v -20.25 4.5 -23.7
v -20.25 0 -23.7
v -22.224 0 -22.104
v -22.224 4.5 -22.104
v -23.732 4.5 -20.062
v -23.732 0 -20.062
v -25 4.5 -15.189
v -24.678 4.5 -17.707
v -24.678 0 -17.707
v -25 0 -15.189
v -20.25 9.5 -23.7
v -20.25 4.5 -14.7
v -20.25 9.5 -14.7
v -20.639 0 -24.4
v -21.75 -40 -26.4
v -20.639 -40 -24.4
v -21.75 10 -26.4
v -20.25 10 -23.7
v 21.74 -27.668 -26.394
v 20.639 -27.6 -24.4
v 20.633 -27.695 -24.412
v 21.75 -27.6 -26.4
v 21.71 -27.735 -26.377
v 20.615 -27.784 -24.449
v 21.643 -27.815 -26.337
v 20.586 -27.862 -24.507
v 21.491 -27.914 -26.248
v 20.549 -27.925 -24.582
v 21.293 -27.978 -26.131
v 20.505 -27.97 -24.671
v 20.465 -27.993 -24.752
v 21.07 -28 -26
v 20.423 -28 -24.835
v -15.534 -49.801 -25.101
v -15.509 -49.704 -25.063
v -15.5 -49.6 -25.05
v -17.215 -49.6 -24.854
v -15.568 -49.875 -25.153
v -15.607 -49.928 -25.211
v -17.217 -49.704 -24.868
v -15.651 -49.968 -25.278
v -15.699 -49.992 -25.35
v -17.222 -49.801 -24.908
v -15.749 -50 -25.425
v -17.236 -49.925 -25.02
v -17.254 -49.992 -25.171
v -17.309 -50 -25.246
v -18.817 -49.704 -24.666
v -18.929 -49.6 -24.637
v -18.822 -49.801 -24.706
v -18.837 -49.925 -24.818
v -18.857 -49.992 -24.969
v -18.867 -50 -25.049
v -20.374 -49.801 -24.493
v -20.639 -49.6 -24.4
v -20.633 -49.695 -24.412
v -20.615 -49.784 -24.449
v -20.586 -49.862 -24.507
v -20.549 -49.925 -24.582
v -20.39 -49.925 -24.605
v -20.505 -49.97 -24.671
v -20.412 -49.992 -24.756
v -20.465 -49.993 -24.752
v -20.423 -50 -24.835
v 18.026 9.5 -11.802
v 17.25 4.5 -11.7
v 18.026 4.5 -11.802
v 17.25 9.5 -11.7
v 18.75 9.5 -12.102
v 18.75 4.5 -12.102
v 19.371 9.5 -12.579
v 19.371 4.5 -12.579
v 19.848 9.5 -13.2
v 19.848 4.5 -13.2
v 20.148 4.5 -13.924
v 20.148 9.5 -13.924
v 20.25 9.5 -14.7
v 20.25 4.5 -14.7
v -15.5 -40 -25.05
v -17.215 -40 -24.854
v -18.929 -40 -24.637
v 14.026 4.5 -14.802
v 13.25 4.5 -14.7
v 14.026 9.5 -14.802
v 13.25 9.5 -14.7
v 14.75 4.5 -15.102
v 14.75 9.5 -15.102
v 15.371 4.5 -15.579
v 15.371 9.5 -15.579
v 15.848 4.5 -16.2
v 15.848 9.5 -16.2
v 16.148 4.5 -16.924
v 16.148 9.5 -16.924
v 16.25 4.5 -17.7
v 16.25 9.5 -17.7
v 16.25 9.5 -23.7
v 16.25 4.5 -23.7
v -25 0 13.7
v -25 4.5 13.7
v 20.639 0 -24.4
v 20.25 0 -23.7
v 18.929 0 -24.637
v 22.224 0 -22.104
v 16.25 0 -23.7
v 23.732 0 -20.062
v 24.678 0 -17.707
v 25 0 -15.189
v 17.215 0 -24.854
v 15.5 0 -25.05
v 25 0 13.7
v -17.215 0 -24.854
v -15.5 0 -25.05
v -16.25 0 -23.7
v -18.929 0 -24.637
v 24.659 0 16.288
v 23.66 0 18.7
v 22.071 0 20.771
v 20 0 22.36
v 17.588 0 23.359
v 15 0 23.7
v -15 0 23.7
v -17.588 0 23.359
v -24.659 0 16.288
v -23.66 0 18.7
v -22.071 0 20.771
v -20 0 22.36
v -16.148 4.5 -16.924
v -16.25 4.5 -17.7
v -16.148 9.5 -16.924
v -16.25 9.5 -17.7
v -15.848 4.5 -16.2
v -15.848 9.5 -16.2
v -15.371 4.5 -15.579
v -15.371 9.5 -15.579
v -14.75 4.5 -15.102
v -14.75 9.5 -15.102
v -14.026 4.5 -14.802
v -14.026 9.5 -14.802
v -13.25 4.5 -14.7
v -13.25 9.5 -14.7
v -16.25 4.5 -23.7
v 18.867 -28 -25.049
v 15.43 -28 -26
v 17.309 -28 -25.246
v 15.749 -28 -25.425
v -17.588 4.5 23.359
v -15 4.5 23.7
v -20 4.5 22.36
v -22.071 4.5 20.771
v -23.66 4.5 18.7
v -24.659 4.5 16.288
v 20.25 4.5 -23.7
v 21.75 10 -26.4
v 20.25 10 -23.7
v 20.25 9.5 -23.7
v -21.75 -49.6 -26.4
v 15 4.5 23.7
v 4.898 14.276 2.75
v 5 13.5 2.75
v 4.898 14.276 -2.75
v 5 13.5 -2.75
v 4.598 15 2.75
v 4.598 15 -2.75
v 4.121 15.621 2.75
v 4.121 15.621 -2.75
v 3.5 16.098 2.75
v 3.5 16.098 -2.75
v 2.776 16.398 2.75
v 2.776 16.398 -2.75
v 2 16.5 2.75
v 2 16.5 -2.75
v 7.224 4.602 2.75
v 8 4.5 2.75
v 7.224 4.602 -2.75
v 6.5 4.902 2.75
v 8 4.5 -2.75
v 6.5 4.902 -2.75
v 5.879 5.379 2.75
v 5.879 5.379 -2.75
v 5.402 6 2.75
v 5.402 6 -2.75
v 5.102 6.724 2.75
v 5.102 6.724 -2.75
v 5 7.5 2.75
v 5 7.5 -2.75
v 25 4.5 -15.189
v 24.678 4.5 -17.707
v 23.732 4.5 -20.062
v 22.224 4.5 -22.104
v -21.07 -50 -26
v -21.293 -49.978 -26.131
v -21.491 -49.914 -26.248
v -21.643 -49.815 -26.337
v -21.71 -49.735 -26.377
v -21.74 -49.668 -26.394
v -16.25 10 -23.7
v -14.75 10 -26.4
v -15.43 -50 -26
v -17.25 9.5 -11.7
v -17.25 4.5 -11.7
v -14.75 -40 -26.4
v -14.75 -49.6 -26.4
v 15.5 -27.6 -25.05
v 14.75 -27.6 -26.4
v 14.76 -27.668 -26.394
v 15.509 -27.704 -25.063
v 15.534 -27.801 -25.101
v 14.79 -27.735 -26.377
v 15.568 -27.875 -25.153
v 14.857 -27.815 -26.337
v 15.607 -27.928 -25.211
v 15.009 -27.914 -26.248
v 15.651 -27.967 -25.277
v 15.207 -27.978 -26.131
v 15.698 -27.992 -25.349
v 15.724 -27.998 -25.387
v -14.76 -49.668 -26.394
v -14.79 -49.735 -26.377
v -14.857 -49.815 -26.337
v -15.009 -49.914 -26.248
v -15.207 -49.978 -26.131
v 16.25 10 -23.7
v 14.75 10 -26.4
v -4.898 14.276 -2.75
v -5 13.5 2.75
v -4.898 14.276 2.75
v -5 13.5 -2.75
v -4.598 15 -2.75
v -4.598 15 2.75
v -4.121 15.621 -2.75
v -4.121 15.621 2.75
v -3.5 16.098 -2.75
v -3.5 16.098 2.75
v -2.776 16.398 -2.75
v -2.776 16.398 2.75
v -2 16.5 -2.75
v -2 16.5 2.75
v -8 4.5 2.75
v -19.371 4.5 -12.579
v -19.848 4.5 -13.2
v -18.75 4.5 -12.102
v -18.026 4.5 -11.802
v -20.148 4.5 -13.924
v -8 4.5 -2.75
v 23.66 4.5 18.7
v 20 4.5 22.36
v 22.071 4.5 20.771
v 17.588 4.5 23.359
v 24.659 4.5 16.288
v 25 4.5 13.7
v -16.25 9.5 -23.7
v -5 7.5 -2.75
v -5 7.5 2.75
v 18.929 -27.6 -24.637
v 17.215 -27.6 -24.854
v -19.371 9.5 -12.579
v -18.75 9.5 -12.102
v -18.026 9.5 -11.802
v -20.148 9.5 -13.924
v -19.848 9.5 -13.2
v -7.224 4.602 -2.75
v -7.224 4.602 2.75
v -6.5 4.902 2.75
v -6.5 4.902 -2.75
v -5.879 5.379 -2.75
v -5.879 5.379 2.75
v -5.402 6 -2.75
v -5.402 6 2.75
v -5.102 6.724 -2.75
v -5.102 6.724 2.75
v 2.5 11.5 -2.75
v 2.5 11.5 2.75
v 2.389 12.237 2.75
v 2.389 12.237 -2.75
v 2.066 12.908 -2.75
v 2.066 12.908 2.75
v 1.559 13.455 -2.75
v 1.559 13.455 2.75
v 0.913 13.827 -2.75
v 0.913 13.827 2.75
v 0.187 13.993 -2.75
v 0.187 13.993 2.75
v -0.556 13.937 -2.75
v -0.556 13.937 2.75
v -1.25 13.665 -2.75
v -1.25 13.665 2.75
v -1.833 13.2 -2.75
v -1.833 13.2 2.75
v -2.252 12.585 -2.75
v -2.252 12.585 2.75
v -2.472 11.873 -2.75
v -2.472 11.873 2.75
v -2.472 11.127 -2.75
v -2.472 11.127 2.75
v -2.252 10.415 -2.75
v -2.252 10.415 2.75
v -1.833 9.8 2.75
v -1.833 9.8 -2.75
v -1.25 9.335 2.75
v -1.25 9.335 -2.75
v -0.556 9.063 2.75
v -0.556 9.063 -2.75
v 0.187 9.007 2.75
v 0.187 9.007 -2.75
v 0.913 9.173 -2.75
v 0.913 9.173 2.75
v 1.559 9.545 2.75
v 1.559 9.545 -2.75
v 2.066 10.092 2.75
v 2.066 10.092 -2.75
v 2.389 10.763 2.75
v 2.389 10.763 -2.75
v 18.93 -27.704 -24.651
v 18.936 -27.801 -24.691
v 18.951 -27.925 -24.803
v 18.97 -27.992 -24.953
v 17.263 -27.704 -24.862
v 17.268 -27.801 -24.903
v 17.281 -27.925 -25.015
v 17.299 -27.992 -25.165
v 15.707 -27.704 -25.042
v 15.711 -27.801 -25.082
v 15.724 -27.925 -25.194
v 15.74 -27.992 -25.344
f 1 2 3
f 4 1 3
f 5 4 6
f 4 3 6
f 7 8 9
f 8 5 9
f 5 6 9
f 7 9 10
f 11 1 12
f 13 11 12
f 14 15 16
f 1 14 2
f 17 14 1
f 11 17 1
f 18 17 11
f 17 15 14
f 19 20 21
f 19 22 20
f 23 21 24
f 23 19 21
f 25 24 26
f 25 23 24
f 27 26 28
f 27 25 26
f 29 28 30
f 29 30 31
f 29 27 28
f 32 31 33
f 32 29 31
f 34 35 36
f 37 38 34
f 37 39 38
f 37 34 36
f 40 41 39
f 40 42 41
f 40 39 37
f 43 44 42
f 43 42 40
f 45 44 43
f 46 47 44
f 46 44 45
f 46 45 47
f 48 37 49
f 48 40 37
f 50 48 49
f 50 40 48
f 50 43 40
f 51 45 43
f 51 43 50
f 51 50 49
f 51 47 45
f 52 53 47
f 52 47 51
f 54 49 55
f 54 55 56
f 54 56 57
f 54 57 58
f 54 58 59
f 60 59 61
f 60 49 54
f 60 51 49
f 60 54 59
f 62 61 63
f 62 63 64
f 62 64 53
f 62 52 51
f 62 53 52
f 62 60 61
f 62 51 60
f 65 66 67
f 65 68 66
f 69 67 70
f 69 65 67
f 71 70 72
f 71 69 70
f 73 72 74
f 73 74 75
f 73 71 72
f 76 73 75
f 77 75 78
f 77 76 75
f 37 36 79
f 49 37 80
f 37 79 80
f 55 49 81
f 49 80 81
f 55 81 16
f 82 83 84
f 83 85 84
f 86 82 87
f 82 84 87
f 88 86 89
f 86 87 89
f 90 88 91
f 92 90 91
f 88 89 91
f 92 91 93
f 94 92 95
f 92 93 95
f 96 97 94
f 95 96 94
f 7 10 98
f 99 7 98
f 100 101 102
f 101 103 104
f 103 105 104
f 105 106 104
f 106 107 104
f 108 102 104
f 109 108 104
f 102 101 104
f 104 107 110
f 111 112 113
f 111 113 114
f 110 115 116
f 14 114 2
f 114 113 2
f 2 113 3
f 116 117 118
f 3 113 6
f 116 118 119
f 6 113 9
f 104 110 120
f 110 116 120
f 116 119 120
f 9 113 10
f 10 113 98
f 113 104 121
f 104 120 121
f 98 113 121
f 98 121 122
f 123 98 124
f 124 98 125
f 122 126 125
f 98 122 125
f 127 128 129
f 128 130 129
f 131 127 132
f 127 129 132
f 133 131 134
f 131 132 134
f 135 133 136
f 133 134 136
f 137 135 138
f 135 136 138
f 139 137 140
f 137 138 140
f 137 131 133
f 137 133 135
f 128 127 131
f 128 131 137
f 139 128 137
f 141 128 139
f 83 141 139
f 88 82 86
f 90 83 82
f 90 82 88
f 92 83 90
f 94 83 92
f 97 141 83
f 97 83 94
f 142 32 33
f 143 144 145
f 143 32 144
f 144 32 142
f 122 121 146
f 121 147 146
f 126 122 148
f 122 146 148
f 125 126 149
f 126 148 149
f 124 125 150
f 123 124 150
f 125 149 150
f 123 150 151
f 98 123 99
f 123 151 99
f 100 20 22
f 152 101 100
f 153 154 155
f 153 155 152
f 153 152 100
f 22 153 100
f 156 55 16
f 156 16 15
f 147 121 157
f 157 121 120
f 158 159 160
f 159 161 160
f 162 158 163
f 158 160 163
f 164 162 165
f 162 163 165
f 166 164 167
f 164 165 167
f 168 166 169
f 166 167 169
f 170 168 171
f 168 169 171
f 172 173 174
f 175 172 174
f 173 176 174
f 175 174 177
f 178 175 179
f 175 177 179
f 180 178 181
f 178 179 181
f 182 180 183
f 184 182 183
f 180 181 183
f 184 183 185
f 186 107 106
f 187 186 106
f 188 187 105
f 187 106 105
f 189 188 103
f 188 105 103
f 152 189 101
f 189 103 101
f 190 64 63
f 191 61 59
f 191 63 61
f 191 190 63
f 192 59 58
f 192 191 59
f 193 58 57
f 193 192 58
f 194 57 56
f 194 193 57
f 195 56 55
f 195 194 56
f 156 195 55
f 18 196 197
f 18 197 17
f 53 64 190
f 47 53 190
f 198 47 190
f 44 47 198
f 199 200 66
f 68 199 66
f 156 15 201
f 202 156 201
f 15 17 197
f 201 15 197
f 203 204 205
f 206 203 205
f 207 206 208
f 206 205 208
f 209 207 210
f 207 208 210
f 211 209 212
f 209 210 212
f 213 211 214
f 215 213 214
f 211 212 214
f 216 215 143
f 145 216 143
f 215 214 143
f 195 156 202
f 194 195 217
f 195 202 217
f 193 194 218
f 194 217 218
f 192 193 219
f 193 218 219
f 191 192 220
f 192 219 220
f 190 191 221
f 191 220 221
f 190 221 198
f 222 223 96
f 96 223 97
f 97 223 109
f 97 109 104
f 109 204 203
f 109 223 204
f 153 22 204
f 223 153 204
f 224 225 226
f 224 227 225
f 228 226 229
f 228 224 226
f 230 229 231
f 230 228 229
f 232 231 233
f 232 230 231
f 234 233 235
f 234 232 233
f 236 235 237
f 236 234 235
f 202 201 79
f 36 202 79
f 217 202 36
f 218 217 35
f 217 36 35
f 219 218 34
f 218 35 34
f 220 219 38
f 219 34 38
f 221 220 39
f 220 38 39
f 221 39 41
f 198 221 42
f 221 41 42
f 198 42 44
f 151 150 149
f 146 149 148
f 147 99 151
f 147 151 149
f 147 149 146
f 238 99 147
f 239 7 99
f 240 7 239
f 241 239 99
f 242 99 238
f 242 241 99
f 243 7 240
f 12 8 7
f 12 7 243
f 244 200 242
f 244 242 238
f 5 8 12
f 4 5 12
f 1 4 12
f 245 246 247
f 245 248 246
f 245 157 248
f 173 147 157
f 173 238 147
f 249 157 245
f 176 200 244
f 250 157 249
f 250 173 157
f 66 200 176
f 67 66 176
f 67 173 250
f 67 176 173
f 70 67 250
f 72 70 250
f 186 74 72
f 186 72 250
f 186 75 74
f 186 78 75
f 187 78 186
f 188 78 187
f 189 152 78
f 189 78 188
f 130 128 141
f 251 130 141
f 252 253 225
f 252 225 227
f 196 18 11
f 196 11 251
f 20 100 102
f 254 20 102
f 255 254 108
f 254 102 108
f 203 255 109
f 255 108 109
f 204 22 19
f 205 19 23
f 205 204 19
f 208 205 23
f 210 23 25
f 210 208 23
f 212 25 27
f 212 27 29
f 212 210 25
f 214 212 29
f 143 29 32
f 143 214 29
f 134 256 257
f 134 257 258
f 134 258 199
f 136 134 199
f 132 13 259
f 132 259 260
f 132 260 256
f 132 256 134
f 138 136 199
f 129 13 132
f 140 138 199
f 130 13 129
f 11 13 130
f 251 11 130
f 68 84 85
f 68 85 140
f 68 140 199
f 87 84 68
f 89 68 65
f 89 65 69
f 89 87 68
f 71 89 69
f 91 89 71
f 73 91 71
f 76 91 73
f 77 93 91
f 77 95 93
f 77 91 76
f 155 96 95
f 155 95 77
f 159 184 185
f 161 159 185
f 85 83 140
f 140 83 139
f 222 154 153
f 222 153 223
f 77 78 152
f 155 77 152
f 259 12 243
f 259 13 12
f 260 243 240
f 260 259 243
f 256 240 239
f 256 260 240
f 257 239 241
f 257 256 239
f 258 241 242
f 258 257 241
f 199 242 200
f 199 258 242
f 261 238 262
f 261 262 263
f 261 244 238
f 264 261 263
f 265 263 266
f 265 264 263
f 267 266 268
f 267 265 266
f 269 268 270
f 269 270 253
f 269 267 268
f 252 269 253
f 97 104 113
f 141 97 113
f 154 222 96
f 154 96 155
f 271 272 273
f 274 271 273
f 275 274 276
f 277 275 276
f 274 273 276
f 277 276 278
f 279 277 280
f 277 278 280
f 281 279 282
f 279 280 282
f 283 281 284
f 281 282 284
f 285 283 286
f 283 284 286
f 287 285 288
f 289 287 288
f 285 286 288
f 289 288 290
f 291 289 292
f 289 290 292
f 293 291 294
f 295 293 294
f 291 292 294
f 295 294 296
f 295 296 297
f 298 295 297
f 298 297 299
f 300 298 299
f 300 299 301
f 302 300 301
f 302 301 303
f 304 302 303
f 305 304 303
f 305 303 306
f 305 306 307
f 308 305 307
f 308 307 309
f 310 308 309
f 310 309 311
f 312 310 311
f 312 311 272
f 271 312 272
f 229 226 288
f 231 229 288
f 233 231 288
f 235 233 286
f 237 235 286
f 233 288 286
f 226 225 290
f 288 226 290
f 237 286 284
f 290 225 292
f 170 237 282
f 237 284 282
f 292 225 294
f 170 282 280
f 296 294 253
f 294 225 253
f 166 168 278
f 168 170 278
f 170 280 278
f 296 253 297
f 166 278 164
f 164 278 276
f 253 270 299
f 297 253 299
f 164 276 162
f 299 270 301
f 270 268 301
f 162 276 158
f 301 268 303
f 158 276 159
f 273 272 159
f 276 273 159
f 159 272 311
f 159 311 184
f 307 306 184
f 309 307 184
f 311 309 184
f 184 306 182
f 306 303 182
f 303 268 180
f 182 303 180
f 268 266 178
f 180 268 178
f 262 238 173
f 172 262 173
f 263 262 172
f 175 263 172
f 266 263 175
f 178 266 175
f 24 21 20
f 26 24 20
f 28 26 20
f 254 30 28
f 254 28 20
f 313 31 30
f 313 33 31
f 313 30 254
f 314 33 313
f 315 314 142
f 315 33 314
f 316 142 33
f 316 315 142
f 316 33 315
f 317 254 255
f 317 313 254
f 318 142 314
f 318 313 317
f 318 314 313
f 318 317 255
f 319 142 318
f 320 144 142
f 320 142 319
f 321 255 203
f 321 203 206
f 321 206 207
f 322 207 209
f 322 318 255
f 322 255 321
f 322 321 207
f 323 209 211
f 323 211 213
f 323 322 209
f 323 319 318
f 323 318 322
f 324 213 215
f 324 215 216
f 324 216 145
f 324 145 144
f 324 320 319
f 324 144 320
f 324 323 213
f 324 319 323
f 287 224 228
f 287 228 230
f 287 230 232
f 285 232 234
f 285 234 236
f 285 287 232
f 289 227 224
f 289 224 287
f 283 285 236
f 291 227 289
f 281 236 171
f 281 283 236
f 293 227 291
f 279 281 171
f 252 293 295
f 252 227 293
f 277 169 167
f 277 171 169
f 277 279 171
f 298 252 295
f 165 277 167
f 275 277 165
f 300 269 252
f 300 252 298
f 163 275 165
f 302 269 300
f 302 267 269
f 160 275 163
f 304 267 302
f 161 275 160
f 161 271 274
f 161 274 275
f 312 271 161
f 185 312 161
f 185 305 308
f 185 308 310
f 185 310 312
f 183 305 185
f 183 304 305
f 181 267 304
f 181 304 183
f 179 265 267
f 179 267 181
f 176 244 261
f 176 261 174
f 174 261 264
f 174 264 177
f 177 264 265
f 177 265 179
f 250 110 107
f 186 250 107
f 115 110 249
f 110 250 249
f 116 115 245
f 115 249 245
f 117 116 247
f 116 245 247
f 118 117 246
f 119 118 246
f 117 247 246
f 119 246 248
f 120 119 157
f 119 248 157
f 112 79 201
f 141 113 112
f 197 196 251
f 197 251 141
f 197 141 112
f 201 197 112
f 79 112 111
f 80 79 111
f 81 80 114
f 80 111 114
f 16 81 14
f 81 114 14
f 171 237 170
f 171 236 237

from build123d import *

# Parameters (mm, degrees)
EXTRUDE_1_DEPTH      = 4.5
EXTRUDE_2_DEPTH      = 40
EXTRUDE_2_DEPTH_BACK = 10
CUT_EXTRUDE_1_DEPTH  = 111
FILLET_1_R           = 10
SKETCH_4_W           = 16.25
SKETCH_4_H           = 3
EXTRUDE_3_DEPTH      = 5
FILLET_2_R           = 10
SKETCH_5_W           = 10
SKETCH_5_H           = 5.5
EXTRUDE_4_DEPTH      = 12
SKETCH_6_R           = 2.5
CUT_EXTRUDE_2_DEPTH  = 6
FILLET_3_R           = 3
FILLET_4_R           = 3
EXTRUDE_5_DEPTH      = 10
SKETCH_8_W           = 7
SKETCH_8_H           = 12
CUT_EXTRUDE_3_DEPTH  = 11.8
FILLET_5_R           = 0.4


with BuildPart() as part:
    # 草图1 → 凸台-拉伸1 (new body)
    with BuildSketch(Plane(origin=(0, 0, 0), x_dir=(1, 0, 0), z_dir=(0, 1, 0))):
        Polygon((-25, 23.7), (-25, -23.7), (25, -23.7), (25, 23.7), (20.25, 23.7), (21.75, 26.4), (14.75, 26.4), (16.25, 23.7), (-16.25, 23.7), (-14.75, 26.4), (-21.75, 26.4), (-20.25, 23.7), align=None)
    extrude(amount=EXTRUDE_1_DEPTH)

    # 草图2 → 凸台-拉伸2 (add, two sides: drawn at the far end of the back side and taken through both)
    with BuildSketch(Plane.XZ.offset(-EXTRUDE_2_DEPTH_BACK)):
        Polygon((-20.25, -23.7), (-16.25, -23.7), (-14.75, -26.4), (-21.75, -26.4), align=None)
        Polygon((16.25, -23.7), (20.25, -23.7), (21.75, -26.4), (14.75, -26.4), align=None)
    extrude(amount=EXTRUDE_2_DEPTH + EXTRUDE_2_DEPTH_BACK)

    # 草图3 → 切除-拉伸1 (cut)
    with BuildSketch(Plane.XZ):
        with BuildLine():
            Line((-25, -23.7), (25, -23.7))
            ThreePointArc((25, -23.7), (0, -25.88674251), (-25, -23.7))
        make_face()
    extrude(amount=CUT_EXTRUDE_1_DEPTH, mode=Mode.SUBTRACT)

    # 圆角1
    # the kernel refuses this fillet: 10 mm, written as the material it takes off along each edge
    with BuildSketch(Plane(origin=(25, -21.277555663, -23.7), x_dir=(0, 0, 1), z_dir=(0, 1, 0))) as fillet_1_piece_1:
        with BuildLine():
            CenterArc((8.511022265, -10), FILLET_1_R, 90, 58.331756746)
            Line((0, -4.75), (-0.170220445, -4.645))
            ThreePointArc((-0.170220445, -4.645), (-0.2, -2.375), (-0.2, 0))
            Line((-0.2, 0), (0, 0.2))
            Line((0, 0.2), (8.511022265, 0.2))
            Line((8.511022265, 0.2), (8.511022265, 0))
        make_face()
    extrude(amount=47.055111326, mode=Mode.SUBTRACT)
    with BuildSketch(Plane(origin=(-25, -21.277555663, -23.7), x_dir=(0, 0, 1), z_dir=(0, 1, 0))) as fillet_1_piece_2:
        with BuildLine():
            CenterArc((8.511022265, 10), FILLET_1_R, 211.668243254, 58.331756746)
            Line((0, 4.75), (-0.170220445, 4.645))
            ThreePointArc((-0.170220445, 4.645), (-0.2, 2.375), (-0.2, 0))
            Line((-0.2, 0), (0, -0.2))
            Line((0, -0.2), (8.511022265, -0.2))
            Line((8.511022265, -0.2), (8.511022265, 0))
        make_face()
    extrude(amount=47.055111326, mode=Mode.SUBTRACT)

    # 草图4 → 凸台-拉伸3 (add)
    with BuildSketch(Plane(origin=(0, 4.5, 0), x_dir=(1, 0, 0), z_dir=(0, 1, 0))):
        Polygon((-16.25, 23.7), (-20.25, 23.7), (-20.25, 11.7), (-16.25, 11.7), (-16.25, 14.7), align=None)
        with Locations((-8.125, 13.2)):
            Rectangle(SKETCH_4_W, SKETCH_4_H)
        with Locations((8.125, 13.2)):
            Rectangle(SKETCH_4_W, SKETCH_4_H)
        Polygon((16.25, 14.7), (16.25, 11.7), (20.25, 11.7), (20.25, 23.7), (16.25, 23.7), align=None)
    extrude(amount=EXTRUDE_3_DEPTH)

    # 圆角2
    fillet_2_edges = [part.edges().sort_by_distance(p)[0] for p in [
        (-25, 2.25, 23.7),
        (25, 2.25, 23.7),
    ]]
    fillet(fillet_2_edges, radius=FILLET_2_R)

    # 草图5 → 凸台-拉伸4 (add)
    with BuildSketch(Plane(origin=(0, 4.5, 0), x_dir=(1, 0, 0), z_dir=(0, 1, 0))):
        Rectangle(SKETCH_5_W, SKETCH_5_H)
    extrude(amount=EXTRUDE_4_DEPTH)

    # 草图6 → 切除-拉伸2 (cut)
    with BuildSketch(Plane.XY.offset(2.75)):
        with Locations((0, 11.5)):
            Circle(SKETCH_6_R)
    extrude(amount=-CUT_EXTRUDE_2_DEPTH, mode=Mode.SUBTRACT)

    # 圆角3
    fillet_3_edges = [part.edges().sort_by_distance(p)[0] for p in [
        (5, 4.5, 0),
        (-5, 4.5, 0),
        (5, 16.5, 0),
        (-5, 16.5, 0),
    ]]
    fillet(fillet_3_edges, radius=FILLET_3_R)

    # 圆角4
    fillet_4_edges = [part.edges().sort_by_distance(p)[0] for p in [
        (-16.25, 7, -14.7),
        (-20.25, 7, -11.7),
        (20.25, 7, -11.7),
        (16.25, 7, -14.7),
    ]]
    fillet(fillet_4_edges, radius=FILLET_4_R)

    # 草图7 → 凸台-拉伸5 (add)
    with BuildSketch(Plane.XZ.offset(40)):
        with BuildLine():
            Line((-14.75, -26.4), (-15.499934547, -25.050117816))
            ThreePointArc((-15.499934547, -25.050117816), (-18.072342022, -24.748180462), (-20.638902789, -24.400025019))
            Line((-20.638902789, -24.400025019), (-21.75, -26.4))
            Line((-21.75, -26.4), (-14.75, -26.4))
        make_face()
    extrude(amount=EXTRUDE_5_DEPTH)

    # 草图8 → 切除-拉伸3 (cut)
    with BuildSketch(Plane(origin=(0, 0, -26.4), x_dir=(-1, 0, 0), z_dir=(0, 0, -1))):
        with Locations((-18.25, -34)):
            Rectangle(SKETCH_8_W, SKETCH_8_H)
    extrude(amount=-CUT_EXTRUDE_3_DEPTH, mode=Mode.SUBTRACT)

    # 圆角5
    fillet_5_edges = [part.edges().sort_by_distance(p)[0] for p in [
        (-18.25, -50, -26.4),
        (-15.124967273, -50, -25.725058908),
        (-18.072342022, -50, -24.748180462),
        (-21.194451394, -50, -25.40001251),
        (18.072342022, -28, -24.748180462),
        (21.194451394, -28, -25.40001251),
        (15.124967273, -28, -25.725058908),
        (18.25, -28, -26.4),
    ]]
    fillet(fillet_5_edges, radius=FILLET_5_R)


solid = part.part
